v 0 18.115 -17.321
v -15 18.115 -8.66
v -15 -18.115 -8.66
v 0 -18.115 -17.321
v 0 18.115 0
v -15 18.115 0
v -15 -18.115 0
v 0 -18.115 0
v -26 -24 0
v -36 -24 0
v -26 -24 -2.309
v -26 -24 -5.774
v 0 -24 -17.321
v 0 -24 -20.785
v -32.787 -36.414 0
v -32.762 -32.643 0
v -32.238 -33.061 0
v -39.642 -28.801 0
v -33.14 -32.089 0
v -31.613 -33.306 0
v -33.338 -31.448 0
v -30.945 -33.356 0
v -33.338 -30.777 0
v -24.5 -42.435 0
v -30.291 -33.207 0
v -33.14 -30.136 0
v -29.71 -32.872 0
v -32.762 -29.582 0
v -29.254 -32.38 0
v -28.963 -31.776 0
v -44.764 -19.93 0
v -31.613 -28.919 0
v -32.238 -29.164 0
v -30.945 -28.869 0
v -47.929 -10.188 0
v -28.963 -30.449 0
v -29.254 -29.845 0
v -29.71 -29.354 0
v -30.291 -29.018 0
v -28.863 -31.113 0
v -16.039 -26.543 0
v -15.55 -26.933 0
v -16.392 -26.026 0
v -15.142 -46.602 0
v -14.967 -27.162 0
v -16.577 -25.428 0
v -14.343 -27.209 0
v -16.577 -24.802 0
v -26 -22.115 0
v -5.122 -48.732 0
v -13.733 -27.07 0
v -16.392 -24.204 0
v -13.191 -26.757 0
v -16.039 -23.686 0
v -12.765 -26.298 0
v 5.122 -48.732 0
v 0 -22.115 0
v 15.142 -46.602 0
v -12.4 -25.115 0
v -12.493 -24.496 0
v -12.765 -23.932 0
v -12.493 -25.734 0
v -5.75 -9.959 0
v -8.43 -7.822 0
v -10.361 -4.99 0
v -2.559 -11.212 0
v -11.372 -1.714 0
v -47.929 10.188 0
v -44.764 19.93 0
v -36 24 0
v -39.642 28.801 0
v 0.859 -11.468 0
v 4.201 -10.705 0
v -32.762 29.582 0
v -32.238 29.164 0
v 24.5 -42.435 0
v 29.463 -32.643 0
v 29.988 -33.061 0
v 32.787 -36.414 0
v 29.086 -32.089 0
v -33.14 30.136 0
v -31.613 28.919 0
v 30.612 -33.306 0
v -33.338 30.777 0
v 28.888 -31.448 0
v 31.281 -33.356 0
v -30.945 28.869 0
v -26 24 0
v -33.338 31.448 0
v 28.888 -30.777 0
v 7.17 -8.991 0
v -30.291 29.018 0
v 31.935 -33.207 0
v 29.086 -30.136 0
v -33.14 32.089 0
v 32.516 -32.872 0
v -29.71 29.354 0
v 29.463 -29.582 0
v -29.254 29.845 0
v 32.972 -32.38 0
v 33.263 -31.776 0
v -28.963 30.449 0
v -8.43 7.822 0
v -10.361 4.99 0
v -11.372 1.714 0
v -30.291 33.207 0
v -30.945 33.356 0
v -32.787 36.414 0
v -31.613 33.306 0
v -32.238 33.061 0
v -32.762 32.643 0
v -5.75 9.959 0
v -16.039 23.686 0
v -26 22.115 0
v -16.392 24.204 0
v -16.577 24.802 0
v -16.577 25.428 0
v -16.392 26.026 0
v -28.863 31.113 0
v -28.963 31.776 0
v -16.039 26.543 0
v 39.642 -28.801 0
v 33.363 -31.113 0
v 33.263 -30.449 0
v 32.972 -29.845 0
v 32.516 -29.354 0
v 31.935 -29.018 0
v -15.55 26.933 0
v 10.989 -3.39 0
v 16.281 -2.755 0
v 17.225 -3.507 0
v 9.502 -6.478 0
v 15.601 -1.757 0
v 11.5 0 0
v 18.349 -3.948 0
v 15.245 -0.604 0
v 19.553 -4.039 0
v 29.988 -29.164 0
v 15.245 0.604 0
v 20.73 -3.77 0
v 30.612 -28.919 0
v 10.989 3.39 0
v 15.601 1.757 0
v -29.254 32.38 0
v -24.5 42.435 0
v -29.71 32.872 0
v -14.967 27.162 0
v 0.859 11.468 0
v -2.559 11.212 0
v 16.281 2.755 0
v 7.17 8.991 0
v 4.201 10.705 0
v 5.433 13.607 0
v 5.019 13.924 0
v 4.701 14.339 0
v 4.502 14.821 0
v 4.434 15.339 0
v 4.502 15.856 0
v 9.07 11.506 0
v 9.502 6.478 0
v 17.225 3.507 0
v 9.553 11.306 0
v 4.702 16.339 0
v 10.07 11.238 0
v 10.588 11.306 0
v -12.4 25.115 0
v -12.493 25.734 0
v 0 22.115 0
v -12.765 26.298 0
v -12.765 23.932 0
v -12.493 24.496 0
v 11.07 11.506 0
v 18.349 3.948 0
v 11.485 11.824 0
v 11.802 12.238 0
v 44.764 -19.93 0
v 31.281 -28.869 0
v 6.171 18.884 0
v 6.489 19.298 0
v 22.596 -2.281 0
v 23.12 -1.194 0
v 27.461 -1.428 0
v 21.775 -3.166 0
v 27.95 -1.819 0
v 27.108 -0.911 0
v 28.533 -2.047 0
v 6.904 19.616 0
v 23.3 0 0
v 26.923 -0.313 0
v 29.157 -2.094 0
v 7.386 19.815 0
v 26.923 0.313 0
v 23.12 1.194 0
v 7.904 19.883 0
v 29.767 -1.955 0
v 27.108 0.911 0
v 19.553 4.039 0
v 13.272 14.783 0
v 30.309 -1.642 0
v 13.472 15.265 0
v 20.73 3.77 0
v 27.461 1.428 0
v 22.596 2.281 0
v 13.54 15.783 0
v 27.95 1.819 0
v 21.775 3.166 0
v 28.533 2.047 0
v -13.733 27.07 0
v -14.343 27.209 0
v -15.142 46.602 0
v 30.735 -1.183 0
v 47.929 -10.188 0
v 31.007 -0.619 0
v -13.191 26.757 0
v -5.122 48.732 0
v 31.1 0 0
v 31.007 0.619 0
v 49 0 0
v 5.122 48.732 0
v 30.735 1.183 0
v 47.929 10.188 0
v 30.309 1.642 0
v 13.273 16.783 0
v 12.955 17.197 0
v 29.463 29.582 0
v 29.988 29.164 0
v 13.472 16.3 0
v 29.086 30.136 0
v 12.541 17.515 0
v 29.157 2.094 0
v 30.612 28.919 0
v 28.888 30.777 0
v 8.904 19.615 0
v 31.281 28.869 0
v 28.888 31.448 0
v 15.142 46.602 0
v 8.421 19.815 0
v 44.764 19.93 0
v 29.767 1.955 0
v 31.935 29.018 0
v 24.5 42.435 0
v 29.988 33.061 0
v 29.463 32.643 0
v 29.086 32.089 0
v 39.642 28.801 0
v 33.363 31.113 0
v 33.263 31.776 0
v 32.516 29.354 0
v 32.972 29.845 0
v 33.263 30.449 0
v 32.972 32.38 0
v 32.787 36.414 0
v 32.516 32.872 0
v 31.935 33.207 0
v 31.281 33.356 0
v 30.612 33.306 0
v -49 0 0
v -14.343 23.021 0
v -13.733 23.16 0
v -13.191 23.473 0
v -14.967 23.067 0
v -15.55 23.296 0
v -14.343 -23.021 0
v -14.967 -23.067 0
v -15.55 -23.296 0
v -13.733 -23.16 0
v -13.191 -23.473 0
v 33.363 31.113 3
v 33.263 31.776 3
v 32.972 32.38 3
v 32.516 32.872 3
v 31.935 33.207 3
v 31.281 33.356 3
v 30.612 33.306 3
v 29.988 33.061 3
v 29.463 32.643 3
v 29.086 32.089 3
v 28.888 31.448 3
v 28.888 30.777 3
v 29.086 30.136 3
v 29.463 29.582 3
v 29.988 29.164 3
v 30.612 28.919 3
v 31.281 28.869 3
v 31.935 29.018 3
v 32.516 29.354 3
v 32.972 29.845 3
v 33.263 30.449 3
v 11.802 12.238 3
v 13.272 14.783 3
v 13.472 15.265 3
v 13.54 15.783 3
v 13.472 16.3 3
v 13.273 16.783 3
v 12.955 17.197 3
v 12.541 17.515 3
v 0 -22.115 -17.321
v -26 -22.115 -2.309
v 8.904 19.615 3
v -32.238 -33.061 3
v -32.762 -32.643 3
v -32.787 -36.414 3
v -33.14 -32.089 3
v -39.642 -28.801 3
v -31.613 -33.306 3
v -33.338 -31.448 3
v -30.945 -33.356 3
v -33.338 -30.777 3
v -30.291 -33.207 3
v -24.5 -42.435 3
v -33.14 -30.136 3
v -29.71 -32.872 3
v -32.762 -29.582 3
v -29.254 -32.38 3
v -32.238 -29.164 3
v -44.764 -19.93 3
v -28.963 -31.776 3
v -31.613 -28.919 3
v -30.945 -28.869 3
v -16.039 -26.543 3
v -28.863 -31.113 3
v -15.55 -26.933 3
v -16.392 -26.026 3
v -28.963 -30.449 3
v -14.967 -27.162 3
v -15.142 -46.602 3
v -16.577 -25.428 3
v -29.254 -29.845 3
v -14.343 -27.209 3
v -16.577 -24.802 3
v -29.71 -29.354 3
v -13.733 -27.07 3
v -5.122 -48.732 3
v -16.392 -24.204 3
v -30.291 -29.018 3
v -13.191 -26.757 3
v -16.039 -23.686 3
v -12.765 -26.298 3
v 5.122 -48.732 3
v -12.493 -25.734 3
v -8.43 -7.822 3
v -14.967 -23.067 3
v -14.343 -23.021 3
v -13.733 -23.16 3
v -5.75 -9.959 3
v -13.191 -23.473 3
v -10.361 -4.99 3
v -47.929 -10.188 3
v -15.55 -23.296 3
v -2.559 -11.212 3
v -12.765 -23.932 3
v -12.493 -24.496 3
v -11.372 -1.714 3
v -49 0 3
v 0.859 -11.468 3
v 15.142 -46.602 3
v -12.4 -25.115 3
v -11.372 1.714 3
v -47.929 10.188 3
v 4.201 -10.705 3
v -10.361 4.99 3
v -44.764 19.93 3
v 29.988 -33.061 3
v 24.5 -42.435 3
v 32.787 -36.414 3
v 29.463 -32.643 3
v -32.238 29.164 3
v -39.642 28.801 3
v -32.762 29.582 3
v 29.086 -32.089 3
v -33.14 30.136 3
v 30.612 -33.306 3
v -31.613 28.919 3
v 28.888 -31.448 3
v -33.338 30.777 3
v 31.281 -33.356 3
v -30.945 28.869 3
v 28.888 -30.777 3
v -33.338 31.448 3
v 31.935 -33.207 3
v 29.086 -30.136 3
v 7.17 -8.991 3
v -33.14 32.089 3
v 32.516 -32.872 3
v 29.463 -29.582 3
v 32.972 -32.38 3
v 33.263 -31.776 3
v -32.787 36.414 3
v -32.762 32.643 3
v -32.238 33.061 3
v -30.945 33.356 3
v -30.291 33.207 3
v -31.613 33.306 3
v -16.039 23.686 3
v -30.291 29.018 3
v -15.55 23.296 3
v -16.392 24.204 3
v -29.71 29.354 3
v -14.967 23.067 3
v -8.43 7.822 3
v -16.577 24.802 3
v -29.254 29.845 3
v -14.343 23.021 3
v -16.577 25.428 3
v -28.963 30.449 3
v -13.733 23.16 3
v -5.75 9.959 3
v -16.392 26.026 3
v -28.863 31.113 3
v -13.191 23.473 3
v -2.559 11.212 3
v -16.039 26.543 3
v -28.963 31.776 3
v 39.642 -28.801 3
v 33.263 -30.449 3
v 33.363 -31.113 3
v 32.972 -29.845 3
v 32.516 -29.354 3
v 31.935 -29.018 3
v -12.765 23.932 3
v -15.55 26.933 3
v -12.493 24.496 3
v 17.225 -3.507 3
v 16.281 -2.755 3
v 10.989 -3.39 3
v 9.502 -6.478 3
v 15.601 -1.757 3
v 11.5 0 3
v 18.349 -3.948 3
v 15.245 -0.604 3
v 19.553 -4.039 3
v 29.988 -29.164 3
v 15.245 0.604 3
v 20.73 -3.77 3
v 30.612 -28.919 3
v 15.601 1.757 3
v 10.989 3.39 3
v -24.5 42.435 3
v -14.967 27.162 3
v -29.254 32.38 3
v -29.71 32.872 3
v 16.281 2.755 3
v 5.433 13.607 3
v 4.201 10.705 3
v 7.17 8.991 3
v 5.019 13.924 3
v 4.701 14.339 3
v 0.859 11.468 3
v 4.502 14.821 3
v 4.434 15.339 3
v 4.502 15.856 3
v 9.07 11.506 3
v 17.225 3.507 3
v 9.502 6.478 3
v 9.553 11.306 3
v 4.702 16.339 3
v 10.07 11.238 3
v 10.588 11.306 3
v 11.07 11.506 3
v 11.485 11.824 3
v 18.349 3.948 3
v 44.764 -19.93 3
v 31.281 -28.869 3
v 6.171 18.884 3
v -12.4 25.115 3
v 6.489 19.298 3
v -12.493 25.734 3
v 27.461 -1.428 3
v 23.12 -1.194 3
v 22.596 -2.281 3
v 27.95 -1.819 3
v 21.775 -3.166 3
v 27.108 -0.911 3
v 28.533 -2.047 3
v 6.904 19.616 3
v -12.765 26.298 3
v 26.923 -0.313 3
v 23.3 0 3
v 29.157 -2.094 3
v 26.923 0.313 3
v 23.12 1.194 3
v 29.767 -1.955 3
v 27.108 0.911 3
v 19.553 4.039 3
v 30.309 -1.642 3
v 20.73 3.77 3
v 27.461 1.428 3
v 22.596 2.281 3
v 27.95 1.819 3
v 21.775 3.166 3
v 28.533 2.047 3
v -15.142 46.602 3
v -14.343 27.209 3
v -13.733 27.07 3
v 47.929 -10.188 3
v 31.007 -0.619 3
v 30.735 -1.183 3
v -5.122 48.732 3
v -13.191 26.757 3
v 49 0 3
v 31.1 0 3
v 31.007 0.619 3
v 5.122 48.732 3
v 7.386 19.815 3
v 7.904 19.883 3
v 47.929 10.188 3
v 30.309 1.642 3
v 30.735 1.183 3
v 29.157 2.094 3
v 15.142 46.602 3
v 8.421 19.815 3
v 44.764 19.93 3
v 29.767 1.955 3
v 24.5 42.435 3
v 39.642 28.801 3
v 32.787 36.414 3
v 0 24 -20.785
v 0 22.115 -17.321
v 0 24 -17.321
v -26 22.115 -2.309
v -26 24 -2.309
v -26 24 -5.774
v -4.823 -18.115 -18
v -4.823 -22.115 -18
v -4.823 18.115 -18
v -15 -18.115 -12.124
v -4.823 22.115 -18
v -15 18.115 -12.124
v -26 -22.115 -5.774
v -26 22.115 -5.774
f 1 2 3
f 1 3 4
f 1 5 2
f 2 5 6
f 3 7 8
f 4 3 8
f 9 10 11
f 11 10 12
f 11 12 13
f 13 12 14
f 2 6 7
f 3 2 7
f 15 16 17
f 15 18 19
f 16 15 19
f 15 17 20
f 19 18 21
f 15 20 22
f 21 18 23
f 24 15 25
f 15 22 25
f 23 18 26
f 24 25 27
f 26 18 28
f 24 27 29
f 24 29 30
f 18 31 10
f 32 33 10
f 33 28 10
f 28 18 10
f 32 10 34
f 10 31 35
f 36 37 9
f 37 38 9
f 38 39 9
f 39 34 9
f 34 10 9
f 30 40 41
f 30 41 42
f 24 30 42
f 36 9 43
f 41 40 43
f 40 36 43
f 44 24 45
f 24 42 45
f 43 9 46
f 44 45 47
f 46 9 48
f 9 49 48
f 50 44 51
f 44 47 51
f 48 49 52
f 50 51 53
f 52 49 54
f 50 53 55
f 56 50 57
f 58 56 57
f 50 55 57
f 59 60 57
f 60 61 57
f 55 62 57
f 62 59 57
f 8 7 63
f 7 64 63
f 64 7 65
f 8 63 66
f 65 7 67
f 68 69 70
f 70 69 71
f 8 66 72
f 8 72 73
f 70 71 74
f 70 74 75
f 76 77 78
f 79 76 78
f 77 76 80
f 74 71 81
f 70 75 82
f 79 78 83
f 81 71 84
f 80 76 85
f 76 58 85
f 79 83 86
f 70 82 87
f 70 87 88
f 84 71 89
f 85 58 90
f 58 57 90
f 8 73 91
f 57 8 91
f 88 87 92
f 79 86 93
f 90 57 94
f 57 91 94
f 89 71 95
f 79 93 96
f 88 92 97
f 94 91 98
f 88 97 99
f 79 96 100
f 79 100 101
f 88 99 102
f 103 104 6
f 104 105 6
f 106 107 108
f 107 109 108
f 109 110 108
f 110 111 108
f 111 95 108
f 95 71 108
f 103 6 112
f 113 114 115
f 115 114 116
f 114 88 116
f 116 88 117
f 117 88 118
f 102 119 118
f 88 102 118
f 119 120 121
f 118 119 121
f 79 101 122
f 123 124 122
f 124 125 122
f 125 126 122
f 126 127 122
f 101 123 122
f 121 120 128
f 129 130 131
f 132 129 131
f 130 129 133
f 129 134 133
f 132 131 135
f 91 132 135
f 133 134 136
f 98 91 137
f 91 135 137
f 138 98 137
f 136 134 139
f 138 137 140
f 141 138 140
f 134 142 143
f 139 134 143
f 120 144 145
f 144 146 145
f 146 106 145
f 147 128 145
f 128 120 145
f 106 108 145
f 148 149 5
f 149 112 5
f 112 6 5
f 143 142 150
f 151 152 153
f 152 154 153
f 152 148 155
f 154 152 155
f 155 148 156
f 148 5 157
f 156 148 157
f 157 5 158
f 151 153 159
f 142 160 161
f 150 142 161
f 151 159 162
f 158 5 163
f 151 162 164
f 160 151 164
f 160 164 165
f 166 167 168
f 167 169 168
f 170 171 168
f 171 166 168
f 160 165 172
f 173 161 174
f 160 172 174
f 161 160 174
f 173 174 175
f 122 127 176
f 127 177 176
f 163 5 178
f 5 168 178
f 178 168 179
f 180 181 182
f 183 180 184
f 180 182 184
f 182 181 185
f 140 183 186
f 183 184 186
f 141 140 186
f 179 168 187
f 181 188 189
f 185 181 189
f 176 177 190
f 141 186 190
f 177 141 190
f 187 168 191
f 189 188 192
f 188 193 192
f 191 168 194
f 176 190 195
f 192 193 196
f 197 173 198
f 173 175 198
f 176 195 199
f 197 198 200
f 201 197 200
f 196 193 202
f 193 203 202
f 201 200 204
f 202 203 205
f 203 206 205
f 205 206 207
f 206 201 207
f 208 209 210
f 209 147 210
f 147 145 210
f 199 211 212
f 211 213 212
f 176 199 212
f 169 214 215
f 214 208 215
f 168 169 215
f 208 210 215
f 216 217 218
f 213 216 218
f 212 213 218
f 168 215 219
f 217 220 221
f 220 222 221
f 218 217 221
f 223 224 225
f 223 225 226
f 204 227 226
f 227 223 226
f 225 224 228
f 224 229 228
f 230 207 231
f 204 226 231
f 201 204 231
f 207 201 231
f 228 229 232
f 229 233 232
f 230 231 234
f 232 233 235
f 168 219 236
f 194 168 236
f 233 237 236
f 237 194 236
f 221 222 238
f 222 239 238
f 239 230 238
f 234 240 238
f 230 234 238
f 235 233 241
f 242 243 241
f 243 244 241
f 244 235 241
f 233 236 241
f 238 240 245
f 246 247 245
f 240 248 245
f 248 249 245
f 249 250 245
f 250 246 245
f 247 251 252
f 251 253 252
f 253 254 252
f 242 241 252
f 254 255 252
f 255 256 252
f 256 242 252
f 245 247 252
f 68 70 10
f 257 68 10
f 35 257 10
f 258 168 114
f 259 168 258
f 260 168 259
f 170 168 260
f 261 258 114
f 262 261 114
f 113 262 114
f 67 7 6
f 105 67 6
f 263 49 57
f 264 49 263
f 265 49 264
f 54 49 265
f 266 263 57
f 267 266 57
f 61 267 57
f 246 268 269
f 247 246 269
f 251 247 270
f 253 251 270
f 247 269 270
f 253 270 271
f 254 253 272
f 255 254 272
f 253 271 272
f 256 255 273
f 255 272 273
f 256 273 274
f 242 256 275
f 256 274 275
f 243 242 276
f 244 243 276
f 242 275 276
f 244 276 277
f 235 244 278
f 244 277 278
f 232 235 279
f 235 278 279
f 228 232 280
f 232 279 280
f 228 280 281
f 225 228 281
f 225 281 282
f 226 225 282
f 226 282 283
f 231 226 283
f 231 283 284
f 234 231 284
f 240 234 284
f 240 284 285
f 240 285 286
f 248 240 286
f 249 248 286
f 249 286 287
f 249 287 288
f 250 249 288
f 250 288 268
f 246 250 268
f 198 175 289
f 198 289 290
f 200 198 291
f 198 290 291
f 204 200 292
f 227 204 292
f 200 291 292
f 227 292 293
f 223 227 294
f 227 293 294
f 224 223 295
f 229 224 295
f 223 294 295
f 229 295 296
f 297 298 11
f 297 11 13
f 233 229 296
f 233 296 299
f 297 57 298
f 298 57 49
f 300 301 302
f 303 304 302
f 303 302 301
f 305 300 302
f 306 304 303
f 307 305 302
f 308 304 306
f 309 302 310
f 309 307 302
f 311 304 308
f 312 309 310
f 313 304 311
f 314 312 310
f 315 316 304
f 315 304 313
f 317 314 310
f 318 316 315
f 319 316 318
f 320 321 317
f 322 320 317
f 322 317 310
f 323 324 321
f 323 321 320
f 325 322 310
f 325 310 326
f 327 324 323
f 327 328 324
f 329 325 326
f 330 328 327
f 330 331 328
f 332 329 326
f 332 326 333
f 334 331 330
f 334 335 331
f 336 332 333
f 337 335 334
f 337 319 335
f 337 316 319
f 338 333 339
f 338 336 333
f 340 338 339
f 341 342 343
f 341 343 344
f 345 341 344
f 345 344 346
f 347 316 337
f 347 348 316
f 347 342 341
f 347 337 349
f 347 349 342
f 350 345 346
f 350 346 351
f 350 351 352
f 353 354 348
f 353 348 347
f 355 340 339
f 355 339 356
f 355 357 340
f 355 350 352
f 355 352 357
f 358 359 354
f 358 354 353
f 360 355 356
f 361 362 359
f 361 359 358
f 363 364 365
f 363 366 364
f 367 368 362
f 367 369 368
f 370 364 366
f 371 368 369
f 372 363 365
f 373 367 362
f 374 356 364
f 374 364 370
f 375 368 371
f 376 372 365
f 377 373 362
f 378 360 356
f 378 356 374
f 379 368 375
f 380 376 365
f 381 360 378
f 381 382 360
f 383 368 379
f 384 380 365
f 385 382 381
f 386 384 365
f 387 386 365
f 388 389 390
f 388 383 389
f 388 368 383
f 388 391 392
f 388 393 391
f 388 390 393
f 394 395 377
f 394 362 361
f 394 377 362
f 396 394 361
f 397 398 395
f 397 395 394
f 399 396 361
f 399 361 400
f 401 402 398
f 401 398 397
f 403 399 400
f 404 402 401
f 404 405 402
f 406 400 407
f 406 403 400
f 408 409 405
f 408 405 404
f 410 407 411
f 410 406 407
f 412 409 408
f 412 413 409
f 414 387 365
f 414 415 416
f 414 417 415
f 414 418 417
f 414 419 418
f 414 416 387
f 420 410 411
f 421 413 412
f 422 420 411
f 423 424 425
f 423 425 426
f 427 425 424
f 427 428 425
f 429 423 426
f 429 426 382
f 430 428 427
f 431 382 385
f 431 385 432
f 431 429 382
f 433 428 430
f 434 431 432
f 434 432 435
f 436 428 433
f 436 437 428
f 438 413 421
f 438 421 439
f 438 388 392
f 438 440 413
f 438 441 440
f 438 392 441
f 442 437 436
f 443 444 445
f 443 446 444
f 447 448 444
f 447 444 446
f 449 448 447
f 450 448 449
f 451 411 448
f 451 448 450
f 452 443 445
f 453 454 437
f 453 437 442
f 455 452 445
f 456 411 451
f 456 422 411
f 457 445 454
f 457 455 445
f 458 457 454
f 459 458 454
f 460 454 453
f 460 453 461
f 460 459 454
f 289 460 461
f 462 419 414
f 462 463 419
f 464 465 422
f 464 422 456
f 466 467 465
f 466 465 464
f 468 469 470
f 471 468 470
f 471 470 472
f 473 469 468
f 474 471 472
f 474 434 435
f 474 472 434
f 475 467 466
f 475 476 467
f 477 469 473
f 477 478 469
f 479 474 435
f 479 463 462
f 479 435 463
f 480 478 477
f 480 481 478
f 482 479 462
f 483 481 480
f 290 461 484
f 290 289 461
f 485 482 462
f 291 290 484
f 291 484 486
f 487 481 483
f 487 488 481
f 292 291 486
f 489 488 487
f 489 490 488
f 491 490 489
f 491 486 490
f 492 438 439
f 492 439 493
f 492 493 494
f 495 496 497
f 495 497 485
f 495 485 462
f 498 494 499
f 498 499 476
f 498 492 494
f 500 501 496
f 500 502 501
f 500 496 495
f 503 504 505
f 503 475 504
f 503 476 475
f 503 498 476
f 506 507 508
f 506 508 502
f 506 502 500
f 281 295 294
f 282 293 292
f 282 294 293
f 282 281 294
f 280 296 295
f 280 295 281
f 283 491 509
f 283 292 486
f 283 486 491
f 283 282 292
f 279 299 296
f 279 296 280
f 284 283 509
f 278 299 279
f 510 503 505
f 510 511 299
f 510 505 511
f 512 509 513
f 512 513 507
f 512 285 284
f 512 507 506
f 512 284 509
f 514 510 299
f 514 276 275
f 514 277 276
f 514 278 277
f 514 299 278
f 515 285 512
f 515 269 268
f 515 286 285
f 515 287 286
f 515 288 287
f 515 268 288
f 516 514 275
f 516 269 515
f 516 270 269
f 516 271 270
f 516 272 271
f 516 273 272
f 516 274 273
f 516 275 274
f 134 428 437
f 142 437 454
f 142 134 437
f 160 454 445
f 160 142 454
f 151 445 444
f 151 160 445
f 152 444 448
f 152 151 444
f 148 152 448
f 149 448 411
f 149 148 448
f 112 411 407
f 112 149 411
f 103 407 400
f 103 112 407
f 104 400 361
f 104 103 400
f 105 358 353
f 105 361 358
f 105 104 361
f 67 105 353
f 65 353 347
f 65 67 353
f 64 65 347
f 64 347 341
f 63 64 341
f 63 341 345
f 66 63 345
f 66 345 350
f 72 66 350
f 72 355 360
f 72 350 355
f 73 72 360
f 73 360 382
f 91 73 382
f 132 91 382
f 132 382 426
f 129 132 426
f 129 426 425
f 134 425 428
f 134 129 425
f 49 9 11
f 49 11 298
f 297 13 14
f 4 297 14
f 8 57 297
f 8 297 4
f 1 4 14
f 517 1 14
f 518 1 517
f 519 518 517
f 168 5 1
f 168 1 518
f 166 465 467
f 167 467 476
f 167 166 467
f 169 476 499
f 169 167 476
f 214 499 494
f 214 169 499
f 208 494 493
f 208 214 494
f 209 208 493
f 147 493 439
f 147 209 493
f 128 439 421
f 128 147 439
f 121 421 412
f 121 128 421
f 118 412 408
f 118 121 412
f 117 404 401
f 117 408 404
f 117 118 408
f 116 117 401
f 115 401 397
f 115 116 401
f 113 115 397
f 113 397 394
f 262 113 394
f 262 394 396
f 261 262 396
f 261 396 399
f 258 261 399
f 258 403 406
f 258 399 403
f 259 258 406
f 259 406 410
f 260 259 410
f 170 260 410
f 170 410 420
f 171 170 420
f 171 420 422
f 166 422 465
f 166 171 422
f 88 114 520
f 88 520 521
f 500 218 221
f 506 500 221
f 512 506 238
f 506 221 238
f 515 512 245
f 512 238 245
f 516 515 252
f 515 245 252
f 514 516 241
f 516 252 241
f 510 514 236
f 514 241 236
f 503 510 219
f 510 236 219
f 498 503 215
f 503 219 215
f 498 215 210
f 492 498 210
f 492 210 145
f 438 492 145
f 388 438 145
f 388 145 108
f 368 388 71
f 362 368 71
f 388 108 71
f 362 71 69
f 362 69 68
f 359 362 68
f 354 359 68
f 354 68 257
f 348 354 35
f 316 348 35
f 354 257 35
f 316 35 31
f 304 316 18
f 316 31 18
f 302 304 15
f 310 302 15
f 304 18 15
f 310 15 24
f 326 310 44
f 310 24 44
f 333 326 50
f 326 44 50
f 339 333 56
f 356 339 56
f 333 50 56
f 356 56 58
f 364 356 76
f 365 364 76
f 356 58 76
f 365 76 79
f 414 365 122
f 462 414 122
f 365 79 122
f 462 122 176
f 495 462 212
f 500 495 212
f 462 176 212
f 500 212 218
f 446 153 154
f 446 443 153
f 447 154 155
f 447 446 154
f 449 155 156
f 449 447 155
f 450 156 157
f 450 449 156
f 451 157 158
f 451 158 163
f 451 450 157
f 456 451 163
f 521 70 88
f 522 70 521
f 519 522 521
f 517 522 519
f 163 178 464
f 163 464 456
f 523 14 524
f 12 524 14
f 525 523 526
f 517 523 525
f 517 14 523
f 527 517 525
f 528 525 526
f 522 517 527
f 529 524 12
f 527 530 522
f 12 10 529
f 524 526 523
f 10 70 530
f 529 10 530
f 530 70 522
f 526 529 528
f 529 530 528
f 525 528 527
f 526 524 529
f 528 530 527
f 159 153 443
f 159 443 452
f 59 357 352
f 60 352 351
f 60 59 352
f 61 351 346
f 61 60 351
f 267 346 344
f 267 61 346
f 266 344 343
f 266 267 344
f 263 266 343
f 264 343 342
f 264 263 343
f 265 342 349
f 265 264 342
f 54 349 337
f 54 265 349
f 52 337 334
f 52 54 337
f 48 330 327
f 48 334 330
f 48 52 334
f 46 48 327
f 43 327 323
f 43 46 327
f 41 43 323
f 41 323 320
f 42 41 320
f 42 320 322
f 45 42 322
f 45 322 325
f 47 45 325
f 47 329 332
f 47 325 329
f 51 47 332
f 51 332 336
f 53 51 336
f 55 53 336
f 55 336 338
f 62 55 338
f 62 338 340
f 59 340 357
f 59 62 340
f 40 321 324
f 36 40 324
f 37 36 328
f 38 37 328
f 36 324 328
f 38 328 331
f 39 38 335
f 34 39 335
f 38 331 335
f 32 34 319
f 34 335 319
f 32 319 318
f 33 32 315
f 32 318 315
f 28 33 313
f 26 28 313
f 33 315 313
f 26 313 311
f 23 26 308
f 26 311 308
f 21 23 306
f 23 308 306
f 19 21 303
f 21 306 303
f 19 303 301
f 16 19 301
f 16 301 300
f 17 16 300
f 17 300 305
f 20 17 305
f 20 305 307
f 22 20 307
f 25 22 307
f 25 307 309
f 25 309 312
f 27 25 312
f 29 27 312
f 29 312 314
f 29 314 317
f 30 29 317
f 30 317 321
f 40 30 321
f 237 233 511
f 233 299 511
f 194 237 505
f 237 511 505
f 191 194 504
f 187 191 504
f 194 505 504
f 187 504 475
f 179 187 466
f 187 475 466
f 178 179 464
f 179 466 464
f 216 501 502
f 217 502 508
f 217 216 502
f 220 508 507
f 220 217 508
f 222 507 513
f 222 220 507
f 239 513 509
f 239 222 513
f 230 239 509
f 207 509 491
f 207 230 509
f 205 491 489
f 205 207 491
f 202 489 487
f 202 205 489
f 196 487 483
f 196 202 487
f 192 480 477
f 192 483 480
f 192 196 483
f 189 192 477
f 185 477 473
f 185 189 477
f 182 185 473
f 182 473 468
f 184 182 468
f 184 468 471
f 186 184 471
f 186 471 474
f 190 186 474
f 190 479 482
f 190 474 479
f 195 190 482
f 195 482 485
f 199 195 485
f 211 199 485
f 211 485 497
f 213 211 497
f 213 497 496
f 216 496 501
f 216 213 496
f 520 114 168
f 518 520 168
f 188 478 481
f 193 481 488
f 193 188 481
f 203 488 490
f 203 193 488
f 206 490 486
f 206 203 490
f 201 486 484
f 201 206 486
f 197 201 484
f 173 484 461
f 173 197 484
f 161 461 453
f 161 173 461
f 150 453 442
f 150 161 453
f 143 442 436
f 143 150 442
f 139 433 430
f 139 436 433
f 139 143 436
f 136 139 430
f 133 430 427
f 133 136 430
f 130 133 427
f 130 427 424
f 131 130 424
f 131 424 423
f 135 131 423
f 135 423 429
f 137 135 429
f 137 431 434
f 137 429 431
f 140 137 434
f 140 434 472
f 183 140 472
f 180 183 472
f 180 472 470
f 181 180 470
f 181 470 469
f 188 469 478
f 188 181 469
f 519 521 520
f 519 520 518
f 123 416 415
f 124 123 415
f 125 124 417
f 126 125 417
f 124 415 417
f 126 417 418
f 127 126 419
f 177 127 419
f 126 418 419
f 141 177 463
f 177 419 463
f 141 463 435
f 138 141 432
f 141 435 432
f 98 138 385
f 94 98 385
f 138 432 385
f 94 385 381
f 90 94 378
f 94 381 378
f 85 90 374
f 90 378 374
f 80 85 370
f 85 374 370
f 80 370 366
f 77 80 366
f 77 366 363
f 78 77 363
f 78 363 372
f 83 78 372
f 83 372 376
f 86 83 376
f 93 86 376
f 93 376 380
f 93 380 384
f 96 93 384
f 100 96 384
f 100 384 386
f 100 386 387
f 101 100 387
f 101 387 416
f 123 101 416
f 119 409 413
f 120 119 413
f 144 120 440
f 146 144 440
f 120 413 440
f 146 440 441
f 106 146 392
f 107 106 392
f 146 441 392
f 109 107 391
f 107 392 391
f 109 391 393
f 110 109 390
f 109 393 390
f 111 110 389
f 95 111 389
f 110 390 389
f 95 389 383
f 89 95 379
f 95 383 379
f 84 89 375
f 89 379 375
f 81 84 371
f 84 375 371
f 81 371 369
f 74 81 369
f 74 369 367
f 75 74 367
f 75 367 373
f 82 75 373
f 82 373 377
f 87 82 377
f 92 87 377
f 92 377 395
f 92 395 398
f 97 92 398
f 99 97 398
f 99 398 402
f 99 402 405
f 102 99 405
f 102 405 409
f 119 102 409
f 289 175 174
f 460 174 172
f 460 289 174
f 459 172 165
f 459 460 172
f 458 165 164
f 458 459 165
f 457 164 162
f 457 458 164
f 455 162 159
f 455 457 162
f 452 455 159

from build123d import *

# Parameters (mm, degrees)
SKETCH_1_R          = 1.6
EXTRUDE_4_DEPTH     = 13
EXTRUDE_4_2_DEPTH   = 13
EXTRUDE_4_3_DEPTH   = 13
EXTRUDE_4_4_DEPTH   = 13
SKETCH_1_R_2        = 2.1
EXTRUDE_4_5_DEPTH   = 13
EXTRUDE_4_6_DEPTH   = 13
EXTRUDE_4_7_DEPTH   = 13
SKETCH_8_R          = 49
EXTRUDE_5_DEPTH     = 3
SKETCH_9_R          = 2.1
CUT_EXTRUDE_2_DEPTH = 13
SKETCH_3_R          = 8.6
CUT_EXTRUDE_3_DEPTH = 13
SKETCH_6_R          = 4.05
CUT_EXTRUDE_4_DEPTH = 13
CUT_EXTRUDE_5_DEPTH = 13
SKETCH_2_R          = 11.5
CUT_EXTRUDE_6_DEPTH = 13
FILLET_1_R          = 2
CUT_EXTRUDE_7_REACH = 71.361
SKETCH_10_R         = 2.25
EXTRUDE_START       = -3
SKETCH_11_R         = 2.1
EXTRUDE_6_DEPTH     = 3
SKETCH_12_W         = 10
SKETCH_12_H         = 48
EXTRUDE_7_DEPTH     = 10
EXTRUDE_8_DEPTH     = 48
SKETCH_16_W         = 15
SKETCH_16_H         = 4
SKETCH_16_W_2       = 11
SKETCH_16_H_2       = 18.11473671
EXTRUDE_9_DEPTH     = 18
CUT_EXTRUDE_8_DEPTH = 48


with BuildPart() as part:
    # 草图1 → 凸台-拉伸4 (new body)
    with BuildSketch(Plane.XY):
        with Locations((0, 44)):
            Circle(SKETCH_1_R)
    extrude(amount=EXTRUDE_4_DEPTH)



with BuildPart() as body_2:
    # 草图1 → Extrude 4 2 (new body)
    with BuildSketch(Plane.XY):
        with Locations((44, 0)):
            Circle(SKETCH_1_R)
    extrude(amount=EXTRUDE_4_2_DEPTH)


with BuildPart() as body_3:
    # 草图1 → Extrude 4 3 (new body)
    with BuildSketch(Plane.XY):
        with Locations((0, -44)):
            Circle(SKETCH_1_R)
    extrude(amount=EXTRUDE_4_3_DEPTH)


with BuildPart() as body_4:
    # 草图1 → Extrude 4 4 (new body)
    with BuildSketch(Plane.XY):
        with Locations((-44, 0)):
            Circle(SKETCH_1_R)
    extrude(amount=EXTRUDE_4_4_DEPTH)


with BuildPart() as body_5:
    # 草图1 → Extrude 4 5 (new body)
    with BuildSketch(Plane.XY):
        with Locations((29, 0)):
            Circle(SKETCH_1_R_2)
    extrude(amount=EXTRUDE_4_5_DEPTH)


with BuildPart() as body_6:
    # 草图1 → Extrude 4 6 (new body)
    with BuildSketch(Plane.XY):
        with Locations((-14.5, 25.11473671)):
            Circle(SKETCH_1_R_2)
    extrude(amount=EXTRUDE_4_6_DEPTH)


with BuildPart() as body_7:
    # 草图1 → Extrude 4 7 (new body)
    with BuildSketch(Plane.XY):
        with Locations((-14.5, -25.11473671)):
            Circle(SKETCH_1_R_2)
    extrude(amount=EXTRUDE_4_7_DEPTH)


with BuildPart() as part_1:
    add(part.part)

    add(body_2.part)  # 凸台-拉伸5 merges body 2

    add(body_3.part)  # 凸台-拉伸5 merges body 3

    add(body_4.part)  # 凸台-拉伸5 merges body 4

    add(body_5.part)  # 凸台-拉伸5 merges body 5

    add(body_6.part)  # 凸台-拉伸5 merges body 6

    add(body_7.part)  # 凸台-拉伸5 merges body 7
    # 草图8 → 凸台-拉伸5 (add)
    with BuildSketch(Plane.XY):
        Circle(SKETCH_8_R)
    extrude(amount=EXTRUDE_5_DEPTH)

    # 草图9 → 切除-拉伸2 (cut)
    with BuildSketch(Plane.XY):
        with Locations((0, 44)):
            Circle(SKETCH_9_R)
        with Locations((44, 0)):
            Circle(SKETCH_9_R)
        with Locations((0, -44)):
            Circle(SKETCH_9_R)
        with Locations((-44, 0)):
            Circle(SKETCH_9_R)
        with Locations((-14.5, 25.11473671)):
            Circle(SKETCH_9_R)
        with Locations((-14.5, -25.11473671)):
            Circle(SKETCH_9_R)
        with Locations((29, 0)):
            Circle(SKETCH_9_R)
    extrude(amount=CUT_EXTRUDE_2_DEPTH, mode=Mode.SUBTRACT)

    # 草图3 → 切除-拉伸3 (cut)
    with BuildSketch(Plane.XY):
        Circle(SKETCH_3_R)
    extrude(amount=CUT_EXTRUDE_3_DEPTH, mode=Mode.SUBTRACT)

    # 草图6 → 切除-拉伸4 (cut)
    with BuildSketch(Plane.XY):
        with Locations((19.25, 0)):
            Circle(SKETCH_6_R)
    extrude(amount=CUT_EXTRUDE_4_DEPTH, mode=Mode.SUBTRACT)

    # 草图7 → 切除-拉伸5 (cut)
    with BuildSketch(Plane.XY):
        Polygon((10.802199699, 10.505830841), (14.272482459, 16.5145615), (7.171657827, 20.615572296), (3.701375067, 14.606841637), align=None)
    extrude(amount=CUT_EXTRUDE_5_DEPTH, mode=Mode.SUBTRACT)

    # 草图2 → 切除-拉伸6 (cut)
    with BuildSketch(Plane.XY):
        Circle(SKETCH_2_R)
    extrude(amount=CUT_EXTRUDE_6_DEPTH, mode=Mode.SUBTRACT)

    # 圆角1
    fillet_1_edges = [part_1.edges().sort_by_distance(p)[0] for p in [
        (7.171657827, 20.615572296, 1.5),
        (3.701375067, 14.606841637, 1.5),
        (10.802199699, 10.505830841, 1.5),
        (14.272482459, 16.5145615, 1.5),
    ]]
    fillet(fillet_1_edges, radius=FILLET_1_R)

    # 草图10 → 切除-拉伸7 (cut, up to next)
    with BuildSketch(Plane.XY.offset(3), mode=Mode.PRIVATE) as cut_extrude_7_sk1:
        with Locations((-31.112698372, 31.112698372)):
            Circle(SKETCH_10_R)
    cut_extrude_7_tool1 = extrude(cut_extrude_7_sk1.sketch, amount=-CUT_EXTRUDE_7_REACH, mode=Mode.PRIVATE) & part_1.part
    # 草图10 → 切除-拉伸7 (cut, up to next)
    with BuildSketch(Plane.XY.offset(3), mode=Mode.PRIVATE) as cut_extrude_7_sk2:
        with Locations((31.112698372, 31.112698372)):
            Circle(SKETCH_10_R)
    cut_extrude_7_tool2 = extrude(cut_extrude_7_sk2.sketch, amount=-CUT_EXTRUDE_7_REACH, mode=Mode.PRIVATE) & part_1.part
    # 草图10 → 切除-拉伸7 (cut, up to next)
    with BuildSketch(Plane.XY.offset(3), mode=Mode.PRIVATE) as cut_extrude_7_sk3:
        with Locations((31.112698372, -31.112698372)):
            Circle(SKETCH_10_R)
    cut_extrude_7_tool3 = extrude(cut_extrude_7_sk3.sketch, amount=-CUT_EXTRUDE_7_REACH, mode=Mode.PRIVATE) & part_1.part
    # 草图10 → 切除-拉伸7 (cut, up to next)
    with BuildSketch(Plane.XY.offset(3), mode=Mode.PRIVATE) as cut_extrude_7_sk4:
        with Locations((-31.112698372, -31.112698372)):
            Circle(SKETCH_10_R)
    cut_extrude_7_tool4 = extrude(cut_extrude_7_sk4.sketch, amount=-CUT_EXTRUDE_7_REACH, mode=Mode.PRIVATE) & part_1.part
    add(cut_extrude_7_tool1.solids().sort_by_distance((-31.112698, 31.112698, 3))[0], mode=Mode.SUBTRACT)
    add(cut_extrude_7_tool2.solids().sort_by_distance((31.112698, 31.112698, 3))[0], mode=Mode.SUBTRACT)
    add(cut_extrude_7_tool3.solids().sort_by_distance((31.112698, -31.112698, 3))[0], mode=Mode.SUBTRACT)
    add(cut_extrude_7_tool4.solids().sort_by_distance((-31.112698, -31.112698, 3))[0], mode=Mode.SUBTRACT)

    # 草图11 → 凸台-拉伸6 (add)
    with BuildSketch(Plane.XY.offset(3).offset(EXTRUDE_START)):
        with Locations((-44, 0)):
            Circle(SKETCH_11_R)
        with Locations((0, -44)):
            Circle(SKETCH_11_R)
        with Locations((44, 0)):
            Circle(SKETCH_11_R)
        with Locations((0, 44)):
            Circle(SKETCH_11_R)
    extrude(amount=EXTRUDE_6_DEPTH)

    # 草图12 → 凸台-拉伸7 (add)
    with BuildSketch(Plane(origin=(0, 0, 0), x_dir=(-1, 0, 0), z_dir=(0, 0, -1))):
        with Locations((31, 0)):
            Rectangle(SKETCH_12_W, SKETCH_12_H)
    extrude(amount=EXTRUDE_7_DEPTH)

    # 草图13 → 凸台-拉伸8 (add)
    with BuildSketch(Plane(origin=(0, 24, 0), x_dir=(1, 0, 0), z_dir=(0, 1, 0))):
        Polygon((0, 20.784609691), (-26, 5.773502692), (-26, 2.309401077), (0, 17.320508076), align=None)
        Polygon((-26, 5.773502692), (-36, 0), (-30, 0), (-26, 2.309401077), align=None)
    extrude(amount=-EXTRUDE_8_DEPTH)

    # 草图16 → 凸台-拉伸9 (add)
    with BuildSketch(Plane(origin=(0, 0, 0), x_dir=(-1, 0, 0), z_dir=(0, 0, -1))):
        with Locations((7.5, -20.11473671)):
            Rectangle(SKETCH_16_W, SKETCH_16_H)
        with Locations((20.5, -20.11473671)):
            Rectangle(SKETCH_16_W_2, SKETCH_16_H)
        with Locations((20.5, -9.057368355)):
            Rectangle(SKETCH_16_W_2, SKETCH_16_H_2)
        with Locations((7.5, 20.11473671)):
            Rectangle(SKETCH_16_W, SKETCH_16_H)
        with Locations((20.5, 20.11473671)):
            Rectangle(SKETCH_16_W_2, SKETCH_16_H)
        with Locations((20.5, 9.057368355)):
            Rectangle(SKETCH_16_W_2, SKETCH_16_H_2)
    extrude(amount=EXTRUDE_9_DEPTH)

    # 草图14 → 切除-拉伸8 (cut)
    with BuildSketch(Plane(origin=(0, 24, 0), x_dir=(1, 0, 0), z_dir=(0, 1, 0))):
        Polygon((0, 20.784609691), (-36, 20.784609691), (-36, 0), align=None)
    extrude(amount=-CUT_EXTRUDE_8_DEPTH, mode=Mode.SUBTRACT)


solid = part_1.part
